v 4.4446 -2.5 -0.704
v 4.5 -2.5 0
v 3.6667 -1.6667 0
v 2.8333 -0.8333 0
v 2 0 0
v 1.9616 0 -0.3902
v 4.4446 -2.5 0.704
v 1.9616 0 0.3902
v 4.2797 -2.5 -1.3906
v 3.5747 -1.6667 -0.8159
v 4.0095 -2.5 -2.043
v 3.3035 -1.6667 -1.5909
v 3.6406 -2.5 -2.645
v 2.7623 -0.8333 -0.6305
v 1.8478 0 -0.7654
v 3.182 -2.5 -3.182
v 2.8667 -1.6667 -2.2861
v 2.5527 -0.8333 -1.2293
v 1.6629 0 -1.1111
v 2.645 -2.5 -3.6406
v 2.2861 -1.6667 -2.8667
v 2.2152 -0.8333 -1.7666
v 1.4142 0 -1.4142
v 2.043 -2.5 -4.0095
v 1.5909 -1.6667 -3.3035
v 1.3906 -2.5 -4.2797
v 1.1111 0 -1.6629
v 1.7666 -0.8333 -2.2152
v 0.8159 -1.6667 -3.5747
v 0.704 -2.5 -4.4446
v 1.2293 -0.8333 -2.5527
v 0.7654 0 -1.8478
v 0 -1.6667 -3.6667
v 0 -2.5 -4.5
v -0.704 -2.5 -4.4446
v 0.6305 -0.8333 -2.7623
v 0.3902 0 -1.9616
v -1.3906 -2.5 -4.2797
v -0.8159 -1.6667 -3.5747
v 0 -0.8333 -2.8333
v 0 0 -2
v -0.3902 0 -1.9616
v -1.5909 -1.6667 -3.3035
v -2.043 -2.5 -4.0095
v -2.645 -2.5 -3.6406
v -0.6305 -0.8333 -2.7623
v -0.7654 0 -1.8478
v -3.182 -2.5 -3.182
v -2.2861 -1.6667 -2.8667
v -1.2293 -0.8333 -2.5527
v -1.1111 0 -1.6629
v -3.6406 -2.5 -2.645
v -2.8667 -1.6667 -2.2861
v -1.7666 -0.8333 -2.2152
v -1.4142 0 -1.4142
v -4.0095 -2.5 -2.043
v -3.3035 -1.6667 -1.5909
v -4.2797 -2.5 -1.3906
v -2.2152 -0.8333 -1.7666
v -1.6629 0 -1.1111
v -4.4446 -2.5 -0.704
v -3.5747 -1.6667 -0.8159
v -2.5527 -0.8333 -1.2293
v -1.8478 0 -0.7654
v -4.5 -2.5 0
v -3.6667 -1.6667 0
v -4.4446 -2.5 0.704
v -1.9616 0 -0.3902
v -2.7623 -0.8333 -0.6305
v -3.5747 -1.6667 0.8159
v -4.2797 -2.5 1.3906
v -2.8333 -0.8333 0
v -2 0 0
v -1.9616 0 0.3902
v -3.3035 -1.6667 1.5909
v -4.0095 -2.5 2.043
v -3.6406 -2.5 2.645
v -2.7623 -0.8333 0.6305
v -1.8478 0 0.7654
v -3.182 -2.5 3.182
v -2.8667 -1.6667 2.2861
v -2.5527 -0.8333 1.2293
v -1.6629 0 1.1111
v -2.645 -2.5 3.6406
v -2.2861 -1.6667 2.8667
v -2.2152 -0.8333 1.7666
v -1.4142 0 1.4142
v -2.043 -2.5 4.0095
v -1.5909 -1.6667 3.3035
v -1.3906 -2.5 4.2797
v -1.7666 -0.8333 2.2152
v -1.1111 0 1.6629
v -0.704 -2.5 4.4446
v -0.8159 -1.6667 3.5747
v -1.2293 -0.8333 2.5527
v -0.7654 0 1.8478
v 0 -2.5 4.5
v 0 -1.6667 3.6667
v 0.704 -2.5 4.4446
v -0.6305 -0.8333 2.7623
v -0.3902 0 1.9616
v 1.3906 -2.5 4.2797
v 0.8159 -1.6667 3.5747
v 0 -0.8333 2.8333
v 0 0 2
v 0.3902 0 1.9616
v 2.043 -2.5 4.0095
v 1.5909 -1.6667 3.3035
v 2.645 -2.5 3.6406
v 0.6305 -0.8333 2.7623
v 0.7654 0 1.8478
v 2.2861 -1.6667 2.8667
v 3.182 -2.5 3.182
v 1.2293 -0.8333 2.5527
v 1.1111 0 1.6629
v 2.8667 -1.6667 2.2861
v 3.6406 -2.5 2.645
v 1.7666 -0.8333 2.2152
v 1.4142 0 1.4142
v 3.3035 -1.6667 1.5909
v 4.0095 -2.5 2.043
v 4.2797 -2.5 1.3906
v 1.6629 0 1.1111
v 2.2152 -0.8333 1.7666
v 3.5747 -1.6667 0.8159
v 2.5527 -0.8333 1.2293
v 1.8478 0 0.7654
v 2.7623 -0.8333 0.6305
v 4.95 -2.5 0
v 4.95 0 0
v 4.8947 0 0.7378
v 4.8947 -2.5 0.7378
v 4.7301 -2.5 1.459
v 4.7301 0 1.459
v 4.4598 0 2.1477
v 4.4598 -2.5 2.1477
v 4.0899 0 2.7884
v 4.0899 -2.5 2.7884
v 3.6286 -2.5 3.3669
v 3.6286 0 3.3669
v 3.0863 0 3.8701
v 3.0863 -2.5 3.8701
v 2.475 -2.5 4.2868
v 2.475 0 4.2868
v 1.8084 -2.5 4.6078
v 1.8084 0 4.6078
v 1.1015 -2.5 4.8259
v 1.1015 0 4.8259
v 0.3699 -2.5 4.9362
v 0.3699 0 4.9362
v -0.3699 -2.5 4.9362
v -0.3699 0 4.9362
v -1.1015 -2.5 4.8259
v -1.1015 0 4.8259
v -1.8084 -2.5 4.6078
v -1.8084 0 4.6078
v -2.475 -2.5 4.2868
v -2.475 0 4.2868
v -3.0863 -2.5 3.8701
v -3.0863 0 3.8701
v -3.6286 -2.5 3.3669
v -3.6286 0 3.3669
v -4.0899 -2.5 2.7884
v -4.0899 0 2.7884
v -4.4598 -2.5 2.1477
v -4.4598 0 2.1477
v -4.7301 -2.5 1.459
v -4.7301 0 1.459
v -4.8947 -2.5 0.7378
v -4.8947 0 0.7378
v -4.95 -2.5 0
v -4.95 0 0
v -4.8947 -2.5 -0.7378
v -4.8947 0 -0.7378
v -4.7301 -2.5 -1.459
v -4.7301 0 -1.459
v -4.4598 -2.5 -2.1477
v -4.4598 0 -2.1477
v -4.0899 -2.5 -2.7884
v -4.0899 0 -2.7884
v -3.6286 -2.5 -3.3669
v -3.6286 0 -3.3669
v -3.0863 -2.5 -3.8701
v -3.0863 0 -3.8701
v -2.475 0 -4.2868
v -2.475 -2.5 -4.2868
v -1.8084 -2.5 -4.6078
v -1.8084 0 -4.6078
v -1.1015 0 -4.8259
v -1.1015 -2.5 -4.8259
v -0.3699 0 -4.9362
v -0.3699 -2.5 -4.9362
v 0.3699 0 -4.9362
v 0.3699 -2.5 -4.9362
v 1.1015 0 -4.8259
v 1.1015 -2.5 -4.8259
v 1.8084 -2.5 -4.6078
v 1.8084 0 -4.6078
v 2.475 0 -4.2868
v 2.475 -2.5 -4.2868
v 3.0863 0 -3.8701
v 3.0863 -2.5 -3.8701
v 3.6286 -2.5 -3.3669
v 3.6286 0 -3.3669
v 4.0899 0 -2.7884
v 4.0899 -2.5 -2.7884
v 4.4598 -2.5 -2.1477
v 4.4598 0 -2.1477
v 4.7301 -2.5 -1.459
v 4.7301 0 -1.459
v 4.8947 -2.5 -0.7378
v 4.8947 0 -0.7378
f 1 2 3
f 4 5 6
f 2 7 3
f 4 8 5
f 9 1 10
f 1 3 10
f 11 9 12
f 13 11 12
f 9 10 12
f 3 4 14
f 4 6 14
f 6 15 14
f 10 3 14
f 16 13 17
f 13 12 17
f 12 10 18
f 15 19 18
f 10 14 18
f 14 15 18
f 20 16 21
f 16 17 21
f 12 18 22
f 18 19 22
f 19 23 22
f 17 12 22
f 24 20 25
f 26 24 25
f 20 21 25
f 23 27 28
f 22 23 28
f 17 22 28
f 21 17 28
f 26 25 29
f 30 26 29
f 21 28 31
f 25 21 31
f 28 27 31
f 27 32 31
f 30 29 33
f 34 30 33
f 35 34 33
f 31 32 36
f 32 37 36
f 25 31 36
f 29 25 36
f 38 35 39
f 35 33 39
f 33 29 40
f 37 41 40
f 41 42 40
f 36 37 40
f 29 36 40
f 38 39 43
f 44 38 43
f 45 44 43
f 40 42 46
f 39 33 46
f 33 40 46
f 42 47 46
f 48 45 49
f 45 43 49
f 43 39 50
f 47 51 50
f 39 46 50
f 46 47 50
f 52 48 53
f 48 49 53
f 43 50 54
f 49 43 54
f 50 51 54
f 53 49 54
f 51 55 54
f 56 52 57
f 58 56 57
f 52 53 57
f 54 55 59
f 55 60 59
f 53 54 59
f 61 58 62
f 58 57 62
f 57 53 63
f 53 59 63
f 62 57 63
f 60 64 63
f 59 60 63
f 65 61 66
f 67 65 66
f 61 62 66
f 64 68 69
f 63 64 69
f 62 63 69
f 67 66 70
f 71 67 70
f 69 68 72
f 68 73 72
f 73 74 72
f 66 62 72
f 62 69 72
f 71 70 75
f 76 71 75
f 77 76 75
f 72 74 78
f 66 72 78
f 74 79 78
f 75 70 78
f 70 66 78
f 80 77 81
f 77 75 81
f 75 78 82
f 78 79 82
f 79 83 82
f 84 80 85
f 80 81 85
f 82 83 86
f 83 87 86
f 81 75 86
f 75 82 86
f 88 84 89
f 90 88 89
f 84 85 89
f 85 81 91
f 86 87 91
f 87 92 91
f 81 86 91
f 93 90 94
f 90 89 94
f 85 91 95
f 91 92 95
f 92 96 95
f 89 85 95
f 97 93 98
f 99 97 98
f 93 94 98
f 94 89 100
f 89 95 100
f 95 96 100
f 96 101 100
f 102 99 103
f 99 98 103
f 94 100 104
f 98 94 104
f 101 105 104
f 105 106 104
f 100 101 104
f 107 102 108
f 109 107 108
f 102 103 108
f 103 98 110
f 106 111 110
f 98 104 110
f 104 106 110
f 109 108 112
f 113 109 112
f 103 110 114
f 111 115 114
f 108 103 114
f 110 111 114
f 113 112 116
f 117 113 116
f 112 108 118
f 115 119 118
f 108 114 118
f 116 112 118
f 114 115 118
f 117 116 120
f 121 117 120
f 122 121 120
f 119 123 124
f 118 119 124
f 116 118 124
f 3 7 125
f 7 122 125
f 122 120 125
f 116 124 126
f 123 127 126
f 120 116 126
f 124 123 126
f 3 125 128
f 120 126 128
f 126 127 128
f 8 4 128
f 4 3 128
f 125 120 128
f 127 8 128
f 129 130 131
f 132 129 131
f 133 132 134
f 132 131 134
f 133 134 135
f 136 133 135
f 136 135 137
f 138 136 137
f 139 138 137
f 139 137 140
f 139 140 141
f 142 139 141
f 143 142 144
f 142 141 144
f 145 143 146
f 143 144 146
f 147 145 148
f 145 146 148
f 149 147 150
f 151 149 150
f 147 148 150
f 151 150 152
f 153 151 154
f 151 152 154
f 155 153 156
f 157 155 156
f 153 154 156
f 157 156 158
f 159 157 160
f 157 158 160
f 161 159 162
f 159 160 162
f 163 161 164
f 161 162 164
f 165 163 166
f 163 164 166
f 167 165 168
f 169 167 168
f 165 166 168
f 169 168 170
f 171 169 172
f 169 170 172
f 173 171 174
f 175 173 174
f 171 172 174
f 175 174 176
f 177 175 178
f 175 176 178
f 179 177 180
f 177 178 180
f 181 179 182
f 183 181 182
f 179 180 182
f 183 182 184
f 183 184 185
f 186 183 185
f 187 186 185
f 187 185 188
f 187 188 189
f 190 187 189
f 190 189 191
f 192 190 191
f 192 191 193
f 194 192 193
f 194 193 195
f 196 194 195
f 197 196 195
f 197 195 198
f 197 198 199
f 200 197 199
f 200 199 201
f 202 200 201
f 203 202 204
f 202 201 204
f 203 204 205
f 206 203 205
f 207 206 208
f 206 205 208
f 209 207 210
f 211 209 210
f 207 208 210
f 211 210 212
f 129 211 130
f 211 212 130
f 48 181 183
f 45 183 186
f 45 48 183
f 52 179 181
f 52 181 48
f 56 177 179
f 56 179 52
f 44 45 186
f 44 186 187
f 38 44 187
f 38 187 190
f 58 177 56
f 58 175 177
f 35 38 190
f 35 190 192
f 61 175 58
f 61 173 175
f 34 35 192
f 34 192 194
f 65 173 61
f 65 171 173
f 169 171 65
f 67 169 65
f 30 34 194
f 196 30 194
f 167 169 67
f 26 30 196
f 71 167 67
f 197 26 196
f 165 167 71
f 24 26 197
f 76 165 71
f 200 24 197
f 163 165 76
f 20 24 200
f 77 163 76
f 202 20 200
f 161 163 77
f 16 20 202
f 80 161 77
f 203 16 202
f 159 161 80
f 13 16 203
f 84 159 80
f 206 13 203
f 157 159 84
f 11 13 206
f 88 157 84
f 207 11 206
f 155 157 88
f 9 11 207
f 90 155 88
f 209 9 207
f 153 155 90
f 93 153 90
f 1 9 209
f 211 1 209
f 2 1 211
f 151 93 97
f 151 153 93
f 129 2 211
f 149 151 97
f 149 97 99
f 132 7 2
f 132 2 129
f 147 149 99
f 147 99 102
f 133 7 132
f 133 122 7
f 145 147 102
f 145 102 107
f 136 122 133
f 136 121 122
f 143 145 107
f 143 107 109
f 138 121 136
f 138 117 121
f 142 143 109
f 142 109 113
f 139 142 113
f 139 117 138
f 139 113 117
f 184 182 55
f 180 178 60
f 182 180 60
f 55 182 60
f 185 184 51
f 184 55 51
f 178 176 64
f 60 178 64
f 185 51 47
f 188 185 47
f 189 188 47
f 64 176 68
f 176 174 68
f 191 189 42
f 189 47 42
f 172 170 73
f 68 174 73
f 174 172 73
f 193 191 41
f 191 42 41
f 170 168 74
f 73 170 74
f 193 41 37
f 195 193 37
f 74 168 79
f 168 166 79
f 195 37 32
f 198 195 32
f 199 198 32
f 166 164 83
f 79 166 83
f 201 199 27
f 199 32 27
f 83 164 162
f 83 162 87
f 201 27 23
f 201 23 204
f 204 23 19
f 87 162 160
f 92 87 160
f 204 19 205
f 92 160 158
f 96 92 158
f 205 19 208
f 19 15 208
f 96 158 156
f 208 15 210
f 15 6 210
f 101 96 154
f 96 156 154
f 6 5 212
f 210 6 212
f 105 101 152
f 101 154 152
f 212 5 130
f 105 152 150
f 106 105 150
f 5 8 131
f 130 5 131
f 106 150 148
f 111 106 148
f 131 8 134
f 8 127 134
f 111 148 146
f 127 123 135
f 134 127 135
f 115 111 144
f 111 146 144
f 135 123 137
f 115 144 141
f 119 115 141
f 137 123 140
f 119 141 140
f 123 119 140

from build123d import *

# Parameters (mm, degrees)
F0_R     = 4.95
F0_R_2   = 3.85
F0_R_3   = 2
F1_DEPTH = 2.5
F2_DEPTH = 3.19
F3_SIZE2 = 2.49999
F3_SIZE  = 2.49999


# Not quite as in the source:
# - a fillet or chamfer is up to 0.001 mm smaller than in the source, because OpenCascade refuses the exact size


with BuildPart() as f1:
    # F0 (on Front) → F1 (new body)
    with BuildSketch(Plane.XZ):
        Circle(F0_R)
        Circle(F0_R_2, mode=Mode.SUBTRACT)
        Circle(F0_R_2)
        Circle(F0_R_3, mode=Mode.SUBTRACT)
        Circle(F0_R_3)
    extrude(amount=F1_DEPTH)

    # F0 (on Front) → F2 (cut)
    with BuildSketch(Plane.XZ):
        Circle(F0_R_3)
    extrude(amount=F2_DEPTH, mode=Mode.SUBTRACT)

    # F3 (size 2.5 and 2.5 in the source; OpenCascade refuses exactly that, so slightly less here)
    f3_edges = [f1.edges().sort_by_distance(p)[0] for p in [
        (-2, -2.5, 0),
    ]]
    chamfer(f3_edges, length=F3_SIZE, length2=F3_SIZE2)


solid = f1.part
